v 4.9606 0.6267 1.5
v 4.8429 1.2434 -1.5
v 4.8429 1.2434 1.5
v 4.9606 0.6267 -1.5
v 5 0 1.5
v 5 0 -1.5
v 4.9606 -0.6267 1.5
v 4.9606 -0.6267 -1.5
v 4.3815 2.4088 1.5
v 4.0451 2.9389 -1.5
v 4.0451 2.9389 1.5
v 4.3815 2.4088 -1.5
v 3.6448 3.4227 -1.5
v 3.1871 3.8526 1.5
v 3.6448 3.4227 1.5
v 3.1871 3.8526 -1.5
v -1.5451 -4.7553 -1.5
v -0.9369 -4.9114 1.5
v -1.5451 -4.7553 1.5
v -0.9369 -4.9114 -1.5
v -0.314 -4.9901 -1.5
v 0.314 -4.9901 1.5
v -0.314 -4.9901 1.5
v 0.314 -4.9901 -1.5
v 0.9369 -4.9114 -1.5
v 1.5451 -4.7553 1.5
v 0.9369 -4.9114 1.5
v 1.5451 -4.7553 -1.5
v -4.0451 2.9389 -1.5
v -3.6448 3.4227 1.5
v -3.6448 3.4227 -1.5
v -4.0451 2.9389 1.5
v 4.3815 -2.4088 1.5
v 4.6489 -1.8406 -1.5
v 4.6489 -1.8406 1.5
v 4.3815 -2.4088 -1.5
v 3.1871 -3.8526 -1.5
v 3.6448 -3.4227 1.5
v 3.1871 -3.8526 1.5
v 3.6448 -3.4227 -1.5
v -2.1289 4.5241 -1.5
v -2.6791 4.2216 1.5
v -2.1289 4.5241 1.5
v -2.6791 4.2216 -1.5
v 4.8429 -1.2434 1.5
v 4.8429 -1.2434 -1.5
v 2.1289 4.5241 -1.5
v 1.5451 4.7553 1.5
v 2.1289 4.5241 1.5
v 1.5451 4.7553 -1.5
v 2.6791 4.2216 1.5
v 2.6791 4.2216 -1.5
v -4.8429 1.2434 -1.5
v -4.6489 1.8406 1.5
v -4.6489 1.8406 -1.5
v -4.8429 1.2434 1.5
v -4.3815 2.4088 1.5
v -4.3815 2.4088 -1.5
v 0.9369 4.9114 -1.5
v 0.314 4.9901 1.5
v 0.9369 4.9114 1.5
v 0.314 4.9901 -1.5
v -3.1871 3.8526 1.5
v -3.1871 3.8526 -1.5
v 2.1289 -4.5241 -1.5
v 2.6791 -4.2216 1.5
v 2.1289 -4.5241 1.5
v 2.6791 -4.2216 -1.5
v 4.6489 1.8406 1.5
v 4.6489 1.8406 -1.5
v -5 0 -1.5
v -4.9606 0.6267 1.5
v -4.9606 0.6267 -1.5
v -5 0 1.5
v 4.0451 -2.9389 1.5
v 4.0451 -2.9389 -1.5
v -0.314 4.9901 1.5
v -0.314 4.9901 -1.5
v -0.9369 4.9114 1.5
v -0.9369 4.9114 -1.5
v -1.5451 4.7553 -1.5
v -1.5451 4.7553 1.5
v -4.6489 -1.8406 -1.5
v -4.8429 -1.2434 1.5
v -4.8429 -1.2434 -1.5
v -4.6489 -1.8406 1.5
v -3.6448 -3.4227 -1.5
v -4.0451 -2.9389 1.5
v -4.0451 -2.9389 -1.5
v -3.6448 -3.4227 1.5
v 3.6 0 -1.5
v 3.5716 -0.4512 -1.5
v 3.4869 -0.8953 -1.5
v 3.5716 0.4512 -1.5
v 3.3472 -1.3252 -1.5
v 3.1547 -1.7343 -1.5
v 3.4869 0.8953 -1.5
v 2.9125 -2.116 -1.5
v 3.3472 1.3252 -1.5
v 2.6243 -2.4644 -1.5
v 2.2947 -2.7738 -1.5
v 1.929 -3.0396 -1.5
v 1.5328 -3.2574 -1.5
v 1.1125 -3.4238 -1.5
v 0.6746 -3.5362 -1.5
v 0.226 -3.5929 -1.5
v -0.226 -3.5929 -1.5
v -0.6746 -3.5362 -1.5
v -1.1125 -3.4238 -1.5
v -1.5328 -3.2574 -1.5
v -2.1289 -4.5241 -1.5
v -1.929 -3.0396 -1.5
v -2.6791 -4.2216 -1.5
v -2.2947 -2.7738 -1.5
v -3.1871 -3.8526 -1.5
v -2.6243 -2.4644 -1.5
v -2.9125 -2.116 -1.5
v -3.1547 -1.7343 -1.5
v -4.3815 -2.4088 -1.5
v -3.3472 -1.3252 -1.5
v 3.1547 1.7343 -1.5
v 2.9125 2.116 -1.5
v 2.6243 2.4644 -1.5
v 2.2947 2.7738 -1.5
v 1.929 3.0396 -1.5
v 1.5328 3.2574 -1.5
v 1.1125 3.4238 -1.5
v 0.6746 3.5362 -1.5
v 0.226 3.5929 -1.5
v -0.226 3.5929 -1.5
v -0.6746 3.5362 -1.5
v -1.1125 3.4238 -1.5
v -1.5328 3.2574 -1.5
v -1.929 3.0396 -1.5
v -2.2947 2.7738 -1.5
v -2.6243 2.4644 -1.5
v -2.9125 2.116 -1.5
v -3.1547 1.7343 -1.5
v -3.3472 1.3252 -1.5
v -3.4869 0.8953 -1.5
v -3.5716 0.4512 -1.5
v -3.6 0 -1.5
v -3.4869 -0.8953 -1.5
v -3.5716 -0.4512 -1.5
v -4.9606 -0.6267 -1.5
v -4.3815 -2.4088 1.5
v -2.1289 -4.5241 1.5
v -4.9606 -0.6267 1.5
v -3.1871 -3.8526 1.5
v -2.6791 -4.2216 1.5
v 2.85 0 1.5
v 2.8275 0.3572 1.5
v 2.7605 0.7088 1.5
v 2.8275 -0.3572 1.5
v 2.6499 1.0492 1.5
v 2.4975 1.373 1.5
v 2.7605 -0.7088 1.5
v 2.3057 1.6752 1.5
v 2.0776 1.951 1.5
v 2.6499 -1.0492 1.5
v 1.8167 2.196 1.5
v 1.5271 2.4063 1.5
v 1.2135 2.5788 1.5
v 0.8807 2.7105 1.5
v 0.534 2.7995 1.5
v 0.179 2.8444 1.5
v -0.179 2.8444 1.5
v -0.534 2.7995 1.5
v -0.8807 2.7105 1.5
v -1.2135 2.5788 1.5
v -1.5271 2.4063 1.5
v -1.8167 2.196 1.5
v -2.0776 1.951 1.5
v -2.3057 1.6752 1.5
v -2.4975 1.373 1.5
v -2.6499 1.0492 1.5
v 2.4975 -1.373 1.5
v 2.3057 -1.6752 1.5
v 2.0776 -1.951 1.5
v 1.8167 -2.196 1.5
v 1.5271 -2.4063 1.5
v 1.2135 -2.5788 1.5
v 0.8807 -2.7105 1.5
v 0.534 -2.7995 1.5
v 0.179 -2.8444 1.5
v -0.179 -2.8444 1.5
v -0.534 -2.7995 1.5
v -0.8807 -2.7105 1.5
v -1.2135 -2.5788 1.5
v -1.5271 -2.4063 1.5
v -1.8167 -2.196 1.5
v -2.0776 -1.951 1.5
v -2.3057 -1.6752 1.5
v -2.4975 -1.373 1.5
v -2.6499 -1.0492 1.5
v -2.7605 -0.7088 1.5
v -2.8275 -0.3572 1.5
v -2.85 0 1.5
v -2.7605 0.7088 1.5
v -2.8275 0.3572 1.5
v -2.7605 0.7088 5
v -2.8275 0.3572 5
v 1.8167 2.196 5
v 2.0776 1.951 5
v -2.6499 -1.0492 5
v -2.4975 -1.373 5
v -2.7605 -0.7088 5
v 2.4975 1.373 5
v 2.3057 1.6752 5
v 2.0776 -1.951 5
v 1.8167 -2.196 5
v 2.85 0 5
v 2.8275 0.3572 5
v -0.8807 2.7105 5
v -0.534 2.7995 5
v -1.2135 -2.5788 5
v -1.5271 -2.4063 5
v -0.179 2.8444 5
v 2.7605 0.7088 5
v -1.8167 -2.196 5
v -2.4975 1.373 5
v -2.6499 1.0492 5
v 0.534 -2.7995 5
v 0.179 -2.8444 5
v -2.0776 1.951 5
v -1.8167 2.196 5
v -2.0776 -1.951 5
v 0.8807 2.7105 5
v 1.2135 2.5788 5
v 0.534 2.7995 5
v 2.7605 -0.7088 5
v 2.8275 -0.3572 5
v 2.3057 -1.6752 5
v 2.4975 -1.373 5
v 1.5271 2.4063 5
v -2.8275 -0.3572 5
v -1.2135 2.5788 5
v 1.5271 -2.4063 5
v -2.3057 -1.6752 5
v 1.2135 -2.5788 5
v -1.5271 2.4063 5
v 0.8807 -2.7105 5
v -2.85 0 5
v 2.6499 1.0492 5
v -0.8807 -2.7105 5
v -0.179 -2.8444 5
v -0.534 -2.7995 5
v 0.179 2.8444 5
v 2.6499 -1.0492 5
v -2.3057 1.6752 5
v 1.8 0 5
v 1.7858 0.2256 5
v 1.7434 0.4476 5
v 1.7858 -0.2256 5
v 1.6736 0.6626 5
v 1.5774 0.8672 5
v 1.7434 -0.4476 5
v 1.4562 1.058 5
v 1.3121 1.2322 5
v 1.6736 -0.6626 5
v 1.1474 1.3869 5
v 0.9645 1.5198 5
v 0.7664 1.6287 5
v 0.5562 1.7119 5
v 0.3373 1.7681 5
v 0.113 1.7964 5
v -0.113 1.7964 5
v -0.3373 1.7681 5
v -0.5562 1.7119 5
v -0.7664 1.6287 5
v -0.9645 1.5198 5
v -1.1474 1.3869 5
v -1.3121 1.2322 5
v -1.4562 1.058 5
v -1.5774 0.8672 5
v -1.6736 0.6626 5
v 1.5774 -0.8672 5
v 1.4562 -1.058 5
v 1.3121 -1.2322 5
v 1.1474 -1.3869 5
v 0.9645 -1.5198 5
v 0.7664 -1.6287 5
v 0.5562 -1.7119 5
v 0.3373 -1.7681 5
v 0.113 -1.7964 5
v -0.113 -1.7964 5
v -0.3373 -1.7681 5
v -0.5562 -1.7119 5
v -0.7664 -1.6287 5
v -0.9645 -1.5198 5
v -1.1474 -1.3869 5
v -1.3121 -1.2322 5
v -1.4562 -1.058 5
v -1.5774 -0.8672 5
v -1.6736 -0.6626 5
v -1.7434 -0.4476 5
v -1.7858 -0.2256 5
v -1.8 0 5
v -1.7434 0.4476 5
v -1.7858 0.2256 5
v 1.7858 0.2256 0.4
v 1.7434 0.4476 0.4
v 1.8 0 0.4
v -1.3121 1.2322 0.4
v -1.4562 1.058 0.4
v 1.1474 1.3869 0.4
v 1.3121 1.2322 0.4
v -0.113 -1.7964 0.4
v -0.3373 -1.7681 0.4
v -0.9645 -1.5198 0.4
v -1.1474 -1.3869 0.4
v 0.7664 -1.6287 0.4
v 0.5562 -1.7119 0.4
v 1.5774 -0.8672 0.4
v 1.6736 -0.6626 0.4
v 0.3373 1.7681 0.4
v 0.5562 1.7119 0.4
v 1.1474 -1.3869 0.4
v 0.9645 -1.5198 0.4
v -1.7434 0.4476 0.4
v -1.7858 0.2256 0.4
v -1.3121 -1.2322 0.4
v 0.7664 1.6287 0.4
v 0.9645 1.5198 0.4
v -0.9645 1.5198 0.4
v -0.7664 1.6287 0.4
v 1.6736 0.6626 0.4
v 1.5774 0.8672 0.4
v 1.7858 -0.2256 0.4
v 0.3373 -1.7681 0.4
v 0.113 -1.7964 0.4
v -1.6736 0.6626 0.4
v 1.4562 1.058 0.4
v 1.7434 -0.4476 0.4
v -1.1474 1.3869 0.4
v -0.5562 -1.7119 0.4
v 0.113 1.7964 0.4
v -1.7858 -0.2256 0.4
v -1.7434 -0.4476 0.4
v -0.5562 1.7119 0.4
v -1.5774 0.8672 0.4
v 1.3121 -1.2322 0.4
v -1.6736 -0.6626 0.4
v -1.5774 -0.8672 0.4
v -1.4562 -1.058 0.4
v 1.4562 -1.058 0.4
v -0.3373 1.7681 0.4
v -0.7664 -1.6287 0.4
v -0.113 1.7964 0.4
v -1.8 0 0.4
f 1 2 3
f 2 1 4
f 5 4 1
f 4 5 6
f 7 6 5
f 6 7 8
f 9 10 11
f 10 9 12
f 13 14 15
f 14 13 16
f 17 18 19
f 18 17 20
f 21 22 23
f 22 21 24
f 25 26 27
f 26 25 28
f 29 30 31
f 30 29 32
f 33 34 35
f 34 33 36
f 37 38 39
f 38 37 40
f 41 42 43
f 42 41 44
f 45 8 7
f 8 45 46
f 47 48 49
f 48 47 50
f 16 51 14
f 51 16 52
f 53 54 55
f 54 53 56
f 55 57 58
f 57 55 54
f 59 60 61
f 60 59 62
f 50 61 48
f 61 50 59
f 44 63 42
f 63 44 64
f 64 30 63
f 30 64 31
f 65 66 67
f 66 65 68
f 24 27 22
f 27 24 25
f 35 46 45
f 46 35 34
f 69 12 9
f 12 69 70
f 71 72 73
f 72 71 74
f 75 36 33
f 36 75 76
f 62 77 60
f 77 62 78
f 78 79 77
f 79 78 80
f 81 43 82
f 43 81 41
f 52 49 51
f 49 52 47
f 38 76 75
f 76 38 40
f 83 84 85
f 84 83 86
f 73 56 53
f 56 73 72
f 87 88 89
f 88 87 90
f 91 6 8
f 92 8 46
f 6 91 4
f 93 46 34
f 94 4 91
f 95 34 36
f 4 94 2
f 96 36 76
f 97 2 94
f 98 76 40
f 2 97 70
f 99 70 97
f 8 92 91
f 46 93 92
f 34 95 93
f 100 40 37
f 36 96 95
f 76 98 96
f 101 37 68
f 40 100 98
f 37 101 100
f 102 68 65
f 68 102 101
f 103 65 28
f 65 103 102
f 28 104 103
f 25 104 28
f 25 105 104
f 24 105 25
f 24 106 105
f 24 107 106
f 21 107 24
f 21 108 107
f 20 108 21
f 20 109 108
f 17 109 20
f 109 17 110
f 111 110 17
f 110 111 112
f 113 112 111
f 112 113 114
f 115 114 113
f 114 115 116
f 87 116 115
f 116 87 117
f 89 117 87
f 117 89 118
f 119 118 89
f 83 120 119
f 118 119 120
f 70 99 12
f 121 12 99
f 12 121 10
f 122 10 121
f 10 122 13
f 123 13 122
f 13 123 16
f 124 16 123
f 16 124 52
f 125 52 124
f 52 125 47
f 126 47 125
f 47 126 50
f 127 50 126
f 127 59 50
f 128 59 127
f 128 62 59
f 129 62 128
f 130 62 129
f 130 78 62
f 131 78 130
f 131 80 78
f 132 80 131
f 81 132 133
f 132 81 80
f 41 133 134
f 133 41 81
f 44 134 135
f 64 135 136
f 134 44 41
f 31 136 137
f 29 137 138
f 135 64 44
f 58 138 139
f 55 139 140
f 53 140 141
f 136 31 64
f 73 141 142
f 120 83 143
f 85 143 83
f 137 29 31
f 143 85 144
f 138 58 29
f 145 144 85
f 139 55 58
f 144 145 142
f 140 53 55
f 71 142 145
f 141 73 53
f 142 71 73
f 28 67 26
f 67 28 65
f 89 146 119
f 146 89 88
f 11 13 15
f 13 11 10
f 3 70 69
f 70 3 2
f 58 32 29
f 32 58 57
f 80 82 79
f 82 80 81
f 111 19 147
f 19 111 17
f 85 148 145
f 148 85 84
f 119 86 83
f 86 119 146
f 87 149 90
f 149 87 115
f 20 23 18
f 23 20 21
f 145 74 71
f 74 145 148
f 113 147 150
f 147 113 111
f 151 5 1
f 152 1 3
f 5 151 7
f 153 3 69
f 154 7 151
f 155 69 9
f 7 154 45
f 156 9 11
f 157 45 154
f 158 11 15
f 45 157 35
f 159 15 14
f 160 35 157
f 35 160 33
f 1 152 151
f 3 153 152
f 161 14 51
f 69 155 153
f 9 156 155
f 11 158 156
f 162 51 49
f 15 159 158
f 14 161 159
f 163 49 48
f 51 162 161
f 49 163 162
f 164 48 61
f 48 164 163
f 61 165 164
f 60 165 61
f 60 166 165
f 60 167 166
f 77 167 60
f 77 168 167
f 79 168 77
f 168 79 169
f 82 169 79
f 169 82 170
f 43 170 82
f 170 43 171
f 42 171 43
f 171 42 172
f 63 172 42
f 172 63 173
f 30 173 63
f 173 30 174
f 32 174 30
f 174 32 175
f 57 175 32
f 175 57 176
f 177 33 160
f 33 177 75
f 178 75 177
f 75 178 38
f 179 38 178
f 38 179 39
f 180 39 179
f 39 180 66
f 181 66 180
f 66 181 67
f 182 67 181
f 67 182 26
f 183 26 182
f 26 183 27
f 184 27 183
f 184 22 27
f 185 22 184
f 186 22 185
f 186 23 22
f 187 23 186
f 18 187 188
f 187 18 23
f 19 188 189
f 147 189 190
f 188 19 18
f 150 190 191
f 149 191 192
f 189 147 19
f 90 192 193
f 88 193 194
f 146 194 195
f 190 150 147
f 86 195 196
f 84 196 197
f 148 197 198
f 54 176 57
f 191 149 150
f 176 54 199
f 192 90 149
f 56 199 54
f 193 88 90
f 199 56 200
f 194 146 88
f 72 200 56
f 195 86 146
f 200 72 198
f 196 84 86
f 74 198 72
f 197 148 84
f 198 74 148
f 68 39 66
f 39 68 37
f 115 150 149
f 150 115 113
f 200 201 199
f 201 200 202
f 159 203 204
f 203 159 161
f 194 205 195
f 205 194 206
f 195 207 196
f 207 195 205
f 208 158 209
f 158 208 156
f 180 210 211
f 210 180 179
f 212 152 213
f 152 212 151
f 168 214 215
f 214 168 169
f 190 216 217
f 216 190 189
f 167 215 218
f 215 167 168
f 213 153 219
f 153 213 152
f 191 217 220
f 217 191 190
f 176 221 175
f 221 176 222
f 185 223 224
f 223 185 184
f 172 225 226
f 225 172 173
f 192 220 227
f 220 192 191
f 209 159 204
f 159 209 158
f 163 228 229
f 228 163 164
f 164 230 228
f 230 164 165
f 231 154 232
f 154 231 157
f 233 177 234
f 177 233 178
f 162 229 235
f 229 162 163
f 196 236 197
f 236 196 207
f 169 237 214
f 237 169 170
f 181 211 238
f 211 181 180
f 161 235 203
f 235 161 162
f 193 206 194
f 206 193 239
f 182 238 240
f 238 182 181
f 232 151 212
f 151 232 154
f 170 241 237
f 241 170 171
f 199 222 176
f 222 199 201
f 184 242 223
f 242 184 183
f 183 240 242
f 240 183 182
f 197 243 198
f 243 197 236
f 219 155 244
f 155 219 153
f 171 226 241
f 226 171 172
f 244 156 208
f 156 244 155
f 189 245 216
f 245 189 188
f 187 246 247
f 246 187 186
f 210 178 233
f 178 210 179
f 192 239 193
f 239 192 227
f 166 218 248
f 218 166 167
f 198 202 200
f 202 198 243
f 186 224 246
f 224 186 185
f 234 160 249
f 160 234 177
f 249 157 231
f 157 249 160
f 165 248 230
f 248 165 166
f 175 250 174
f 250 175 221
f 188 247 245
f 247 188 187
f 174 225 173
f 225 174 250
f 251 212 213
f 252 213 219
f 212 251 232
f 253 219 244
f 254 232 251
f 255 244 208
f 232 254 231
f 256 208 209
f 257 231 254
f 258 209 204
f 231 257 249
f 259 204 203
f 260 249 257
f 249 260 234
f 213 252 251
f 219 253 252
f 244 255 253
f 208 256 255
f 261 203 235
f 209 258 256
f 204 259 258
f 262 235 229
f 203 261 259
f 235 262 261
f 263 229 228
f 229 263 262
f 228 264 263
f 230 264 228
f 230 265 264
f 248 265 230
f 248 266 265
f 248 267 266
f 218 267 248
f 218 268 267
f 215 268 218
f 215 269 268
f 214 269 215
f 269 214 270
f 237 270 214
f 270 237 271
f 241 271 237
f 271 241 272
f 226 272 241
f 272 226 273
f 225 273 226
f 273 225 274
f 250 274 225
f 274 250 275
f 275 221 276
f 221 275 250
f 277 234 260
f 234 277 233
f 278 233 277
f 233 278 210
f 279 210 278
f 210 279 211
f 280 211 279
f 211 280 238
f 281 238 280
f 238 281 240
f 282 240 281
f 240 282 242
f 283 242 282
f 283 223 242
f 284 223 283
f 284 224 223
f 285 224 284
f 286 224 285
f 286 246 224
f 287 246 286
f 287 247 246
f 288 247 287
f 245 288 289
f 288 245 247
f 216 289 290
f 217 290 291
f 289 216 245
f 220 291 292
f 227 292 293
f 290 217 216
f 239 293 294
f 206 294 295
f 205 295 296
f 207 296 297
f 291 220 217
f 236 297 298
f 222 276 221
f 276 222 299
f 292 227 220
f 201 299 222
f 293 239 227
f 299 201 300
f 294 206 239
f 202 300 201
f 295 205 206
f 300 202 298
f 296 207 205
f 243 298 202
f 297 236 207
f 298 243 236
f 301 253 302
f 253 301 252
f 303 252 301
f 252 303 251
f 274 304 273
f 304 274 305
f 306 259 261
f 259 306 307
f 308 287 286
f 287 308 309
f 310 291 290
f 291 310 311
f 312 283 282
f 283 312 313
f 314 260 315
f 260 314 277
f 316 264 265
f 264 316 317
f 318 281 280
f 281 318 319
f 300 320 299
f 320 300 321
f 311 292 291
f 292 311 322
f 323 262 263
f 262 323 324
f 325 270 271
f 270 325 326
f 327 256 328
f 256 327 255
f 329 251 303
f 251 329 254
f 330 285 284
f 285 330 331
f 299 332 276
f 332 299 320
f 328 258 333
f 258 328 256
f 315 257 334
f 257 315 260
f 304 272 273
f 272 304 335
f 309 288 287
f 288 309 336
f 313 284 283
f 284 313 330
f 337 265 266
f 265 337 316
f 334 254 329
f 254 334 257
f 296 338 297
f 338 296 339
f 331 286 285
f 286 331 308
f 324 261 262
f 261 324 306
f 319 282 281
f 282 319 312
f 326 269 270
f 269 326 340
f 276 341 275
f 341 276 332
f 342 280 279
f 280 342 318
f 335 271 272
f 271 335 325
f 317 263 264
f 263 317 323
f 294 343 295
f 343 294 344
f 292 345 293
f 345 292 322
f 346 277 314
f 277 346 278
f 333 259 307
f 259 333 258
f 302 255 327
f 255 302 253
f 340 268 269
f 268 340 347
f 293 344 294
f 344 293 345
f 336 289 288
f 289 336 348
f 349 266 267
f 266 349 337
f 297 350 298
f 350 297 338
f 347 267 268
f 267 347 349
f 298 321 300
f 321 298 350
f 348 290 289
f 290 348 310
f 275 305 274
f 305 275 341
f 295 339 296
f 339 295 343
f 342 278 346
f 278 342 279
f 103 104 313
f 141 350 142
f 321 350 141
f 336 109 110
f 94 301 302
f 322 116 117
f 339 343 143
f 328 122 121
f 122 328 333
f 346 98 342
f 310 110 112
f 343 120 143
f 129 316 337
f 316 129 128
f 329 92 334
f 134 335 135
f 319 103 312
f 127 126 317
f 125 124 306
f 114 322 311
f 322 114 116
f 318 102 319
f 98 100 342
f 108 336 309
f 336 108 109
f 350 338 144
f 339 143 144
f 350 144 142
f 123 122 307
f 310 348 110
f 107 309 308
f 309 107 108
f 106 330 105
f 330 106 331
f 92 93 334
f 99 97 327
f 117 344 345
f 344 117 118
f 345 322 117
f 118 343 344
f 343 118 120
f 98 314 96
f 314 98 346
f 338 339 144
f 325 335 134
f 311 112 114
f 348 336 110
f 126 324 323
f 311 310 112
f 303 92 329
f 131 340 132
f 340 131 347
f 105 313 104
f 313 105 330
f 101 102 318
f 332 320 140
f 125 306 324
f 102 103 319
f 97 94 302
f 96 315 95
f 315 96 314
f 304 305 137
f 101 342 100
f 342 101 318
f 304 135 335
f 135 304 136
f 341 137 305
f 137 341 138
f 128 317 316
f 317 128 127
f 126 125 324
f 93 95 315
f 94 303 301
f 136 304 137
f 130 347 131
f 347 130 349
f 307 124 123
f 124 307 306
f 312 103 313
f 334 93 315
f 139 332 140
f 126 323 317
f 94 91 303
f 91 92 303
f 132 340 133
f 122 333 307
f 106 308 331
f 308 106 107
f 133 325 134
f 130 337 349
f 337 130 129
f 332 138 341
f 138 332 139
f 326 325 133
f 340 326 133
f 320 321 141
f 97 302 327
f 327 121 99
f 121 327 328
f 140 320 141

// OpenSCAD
$fn = 50;


difference() {
	union() {
		translate(v = [0, 0, -1.5000000000]) {
			rotate(a = [0, 0, 0]) {
				cylinder(h = 3, r = 5.0000000000);
			}
		}
		translate(v = [0, 0, -1.5000000000]) {
			rotate(a = [0, 0, 0]) {
				cylinder(h = 6.5000000000, r = 2.8500000000);
			}
		}
	}
	union() {
		translate(v = [0, 0, -125.0000000000]) {
			rotate(a = [0, 0, 0]) {
				cylinder(h = 250, r = 1.8000000000);
			}
		}
		#translate(v = [0, 0, 0.4000000000]) {
			rotate(a = [0, 180, 0]) {
				cylinder(h = 1.9000000000, r1 = 1.8000000000, r2 = 3.6000000000);
			}
		}
		#translate(v = [0, 0, 5.0000000000]) {
			rotate(a = [0, 180, 0]) {
				cylinder(h = 6.5000000000, r = 1.8000000000);
			}
		}
	}
}
